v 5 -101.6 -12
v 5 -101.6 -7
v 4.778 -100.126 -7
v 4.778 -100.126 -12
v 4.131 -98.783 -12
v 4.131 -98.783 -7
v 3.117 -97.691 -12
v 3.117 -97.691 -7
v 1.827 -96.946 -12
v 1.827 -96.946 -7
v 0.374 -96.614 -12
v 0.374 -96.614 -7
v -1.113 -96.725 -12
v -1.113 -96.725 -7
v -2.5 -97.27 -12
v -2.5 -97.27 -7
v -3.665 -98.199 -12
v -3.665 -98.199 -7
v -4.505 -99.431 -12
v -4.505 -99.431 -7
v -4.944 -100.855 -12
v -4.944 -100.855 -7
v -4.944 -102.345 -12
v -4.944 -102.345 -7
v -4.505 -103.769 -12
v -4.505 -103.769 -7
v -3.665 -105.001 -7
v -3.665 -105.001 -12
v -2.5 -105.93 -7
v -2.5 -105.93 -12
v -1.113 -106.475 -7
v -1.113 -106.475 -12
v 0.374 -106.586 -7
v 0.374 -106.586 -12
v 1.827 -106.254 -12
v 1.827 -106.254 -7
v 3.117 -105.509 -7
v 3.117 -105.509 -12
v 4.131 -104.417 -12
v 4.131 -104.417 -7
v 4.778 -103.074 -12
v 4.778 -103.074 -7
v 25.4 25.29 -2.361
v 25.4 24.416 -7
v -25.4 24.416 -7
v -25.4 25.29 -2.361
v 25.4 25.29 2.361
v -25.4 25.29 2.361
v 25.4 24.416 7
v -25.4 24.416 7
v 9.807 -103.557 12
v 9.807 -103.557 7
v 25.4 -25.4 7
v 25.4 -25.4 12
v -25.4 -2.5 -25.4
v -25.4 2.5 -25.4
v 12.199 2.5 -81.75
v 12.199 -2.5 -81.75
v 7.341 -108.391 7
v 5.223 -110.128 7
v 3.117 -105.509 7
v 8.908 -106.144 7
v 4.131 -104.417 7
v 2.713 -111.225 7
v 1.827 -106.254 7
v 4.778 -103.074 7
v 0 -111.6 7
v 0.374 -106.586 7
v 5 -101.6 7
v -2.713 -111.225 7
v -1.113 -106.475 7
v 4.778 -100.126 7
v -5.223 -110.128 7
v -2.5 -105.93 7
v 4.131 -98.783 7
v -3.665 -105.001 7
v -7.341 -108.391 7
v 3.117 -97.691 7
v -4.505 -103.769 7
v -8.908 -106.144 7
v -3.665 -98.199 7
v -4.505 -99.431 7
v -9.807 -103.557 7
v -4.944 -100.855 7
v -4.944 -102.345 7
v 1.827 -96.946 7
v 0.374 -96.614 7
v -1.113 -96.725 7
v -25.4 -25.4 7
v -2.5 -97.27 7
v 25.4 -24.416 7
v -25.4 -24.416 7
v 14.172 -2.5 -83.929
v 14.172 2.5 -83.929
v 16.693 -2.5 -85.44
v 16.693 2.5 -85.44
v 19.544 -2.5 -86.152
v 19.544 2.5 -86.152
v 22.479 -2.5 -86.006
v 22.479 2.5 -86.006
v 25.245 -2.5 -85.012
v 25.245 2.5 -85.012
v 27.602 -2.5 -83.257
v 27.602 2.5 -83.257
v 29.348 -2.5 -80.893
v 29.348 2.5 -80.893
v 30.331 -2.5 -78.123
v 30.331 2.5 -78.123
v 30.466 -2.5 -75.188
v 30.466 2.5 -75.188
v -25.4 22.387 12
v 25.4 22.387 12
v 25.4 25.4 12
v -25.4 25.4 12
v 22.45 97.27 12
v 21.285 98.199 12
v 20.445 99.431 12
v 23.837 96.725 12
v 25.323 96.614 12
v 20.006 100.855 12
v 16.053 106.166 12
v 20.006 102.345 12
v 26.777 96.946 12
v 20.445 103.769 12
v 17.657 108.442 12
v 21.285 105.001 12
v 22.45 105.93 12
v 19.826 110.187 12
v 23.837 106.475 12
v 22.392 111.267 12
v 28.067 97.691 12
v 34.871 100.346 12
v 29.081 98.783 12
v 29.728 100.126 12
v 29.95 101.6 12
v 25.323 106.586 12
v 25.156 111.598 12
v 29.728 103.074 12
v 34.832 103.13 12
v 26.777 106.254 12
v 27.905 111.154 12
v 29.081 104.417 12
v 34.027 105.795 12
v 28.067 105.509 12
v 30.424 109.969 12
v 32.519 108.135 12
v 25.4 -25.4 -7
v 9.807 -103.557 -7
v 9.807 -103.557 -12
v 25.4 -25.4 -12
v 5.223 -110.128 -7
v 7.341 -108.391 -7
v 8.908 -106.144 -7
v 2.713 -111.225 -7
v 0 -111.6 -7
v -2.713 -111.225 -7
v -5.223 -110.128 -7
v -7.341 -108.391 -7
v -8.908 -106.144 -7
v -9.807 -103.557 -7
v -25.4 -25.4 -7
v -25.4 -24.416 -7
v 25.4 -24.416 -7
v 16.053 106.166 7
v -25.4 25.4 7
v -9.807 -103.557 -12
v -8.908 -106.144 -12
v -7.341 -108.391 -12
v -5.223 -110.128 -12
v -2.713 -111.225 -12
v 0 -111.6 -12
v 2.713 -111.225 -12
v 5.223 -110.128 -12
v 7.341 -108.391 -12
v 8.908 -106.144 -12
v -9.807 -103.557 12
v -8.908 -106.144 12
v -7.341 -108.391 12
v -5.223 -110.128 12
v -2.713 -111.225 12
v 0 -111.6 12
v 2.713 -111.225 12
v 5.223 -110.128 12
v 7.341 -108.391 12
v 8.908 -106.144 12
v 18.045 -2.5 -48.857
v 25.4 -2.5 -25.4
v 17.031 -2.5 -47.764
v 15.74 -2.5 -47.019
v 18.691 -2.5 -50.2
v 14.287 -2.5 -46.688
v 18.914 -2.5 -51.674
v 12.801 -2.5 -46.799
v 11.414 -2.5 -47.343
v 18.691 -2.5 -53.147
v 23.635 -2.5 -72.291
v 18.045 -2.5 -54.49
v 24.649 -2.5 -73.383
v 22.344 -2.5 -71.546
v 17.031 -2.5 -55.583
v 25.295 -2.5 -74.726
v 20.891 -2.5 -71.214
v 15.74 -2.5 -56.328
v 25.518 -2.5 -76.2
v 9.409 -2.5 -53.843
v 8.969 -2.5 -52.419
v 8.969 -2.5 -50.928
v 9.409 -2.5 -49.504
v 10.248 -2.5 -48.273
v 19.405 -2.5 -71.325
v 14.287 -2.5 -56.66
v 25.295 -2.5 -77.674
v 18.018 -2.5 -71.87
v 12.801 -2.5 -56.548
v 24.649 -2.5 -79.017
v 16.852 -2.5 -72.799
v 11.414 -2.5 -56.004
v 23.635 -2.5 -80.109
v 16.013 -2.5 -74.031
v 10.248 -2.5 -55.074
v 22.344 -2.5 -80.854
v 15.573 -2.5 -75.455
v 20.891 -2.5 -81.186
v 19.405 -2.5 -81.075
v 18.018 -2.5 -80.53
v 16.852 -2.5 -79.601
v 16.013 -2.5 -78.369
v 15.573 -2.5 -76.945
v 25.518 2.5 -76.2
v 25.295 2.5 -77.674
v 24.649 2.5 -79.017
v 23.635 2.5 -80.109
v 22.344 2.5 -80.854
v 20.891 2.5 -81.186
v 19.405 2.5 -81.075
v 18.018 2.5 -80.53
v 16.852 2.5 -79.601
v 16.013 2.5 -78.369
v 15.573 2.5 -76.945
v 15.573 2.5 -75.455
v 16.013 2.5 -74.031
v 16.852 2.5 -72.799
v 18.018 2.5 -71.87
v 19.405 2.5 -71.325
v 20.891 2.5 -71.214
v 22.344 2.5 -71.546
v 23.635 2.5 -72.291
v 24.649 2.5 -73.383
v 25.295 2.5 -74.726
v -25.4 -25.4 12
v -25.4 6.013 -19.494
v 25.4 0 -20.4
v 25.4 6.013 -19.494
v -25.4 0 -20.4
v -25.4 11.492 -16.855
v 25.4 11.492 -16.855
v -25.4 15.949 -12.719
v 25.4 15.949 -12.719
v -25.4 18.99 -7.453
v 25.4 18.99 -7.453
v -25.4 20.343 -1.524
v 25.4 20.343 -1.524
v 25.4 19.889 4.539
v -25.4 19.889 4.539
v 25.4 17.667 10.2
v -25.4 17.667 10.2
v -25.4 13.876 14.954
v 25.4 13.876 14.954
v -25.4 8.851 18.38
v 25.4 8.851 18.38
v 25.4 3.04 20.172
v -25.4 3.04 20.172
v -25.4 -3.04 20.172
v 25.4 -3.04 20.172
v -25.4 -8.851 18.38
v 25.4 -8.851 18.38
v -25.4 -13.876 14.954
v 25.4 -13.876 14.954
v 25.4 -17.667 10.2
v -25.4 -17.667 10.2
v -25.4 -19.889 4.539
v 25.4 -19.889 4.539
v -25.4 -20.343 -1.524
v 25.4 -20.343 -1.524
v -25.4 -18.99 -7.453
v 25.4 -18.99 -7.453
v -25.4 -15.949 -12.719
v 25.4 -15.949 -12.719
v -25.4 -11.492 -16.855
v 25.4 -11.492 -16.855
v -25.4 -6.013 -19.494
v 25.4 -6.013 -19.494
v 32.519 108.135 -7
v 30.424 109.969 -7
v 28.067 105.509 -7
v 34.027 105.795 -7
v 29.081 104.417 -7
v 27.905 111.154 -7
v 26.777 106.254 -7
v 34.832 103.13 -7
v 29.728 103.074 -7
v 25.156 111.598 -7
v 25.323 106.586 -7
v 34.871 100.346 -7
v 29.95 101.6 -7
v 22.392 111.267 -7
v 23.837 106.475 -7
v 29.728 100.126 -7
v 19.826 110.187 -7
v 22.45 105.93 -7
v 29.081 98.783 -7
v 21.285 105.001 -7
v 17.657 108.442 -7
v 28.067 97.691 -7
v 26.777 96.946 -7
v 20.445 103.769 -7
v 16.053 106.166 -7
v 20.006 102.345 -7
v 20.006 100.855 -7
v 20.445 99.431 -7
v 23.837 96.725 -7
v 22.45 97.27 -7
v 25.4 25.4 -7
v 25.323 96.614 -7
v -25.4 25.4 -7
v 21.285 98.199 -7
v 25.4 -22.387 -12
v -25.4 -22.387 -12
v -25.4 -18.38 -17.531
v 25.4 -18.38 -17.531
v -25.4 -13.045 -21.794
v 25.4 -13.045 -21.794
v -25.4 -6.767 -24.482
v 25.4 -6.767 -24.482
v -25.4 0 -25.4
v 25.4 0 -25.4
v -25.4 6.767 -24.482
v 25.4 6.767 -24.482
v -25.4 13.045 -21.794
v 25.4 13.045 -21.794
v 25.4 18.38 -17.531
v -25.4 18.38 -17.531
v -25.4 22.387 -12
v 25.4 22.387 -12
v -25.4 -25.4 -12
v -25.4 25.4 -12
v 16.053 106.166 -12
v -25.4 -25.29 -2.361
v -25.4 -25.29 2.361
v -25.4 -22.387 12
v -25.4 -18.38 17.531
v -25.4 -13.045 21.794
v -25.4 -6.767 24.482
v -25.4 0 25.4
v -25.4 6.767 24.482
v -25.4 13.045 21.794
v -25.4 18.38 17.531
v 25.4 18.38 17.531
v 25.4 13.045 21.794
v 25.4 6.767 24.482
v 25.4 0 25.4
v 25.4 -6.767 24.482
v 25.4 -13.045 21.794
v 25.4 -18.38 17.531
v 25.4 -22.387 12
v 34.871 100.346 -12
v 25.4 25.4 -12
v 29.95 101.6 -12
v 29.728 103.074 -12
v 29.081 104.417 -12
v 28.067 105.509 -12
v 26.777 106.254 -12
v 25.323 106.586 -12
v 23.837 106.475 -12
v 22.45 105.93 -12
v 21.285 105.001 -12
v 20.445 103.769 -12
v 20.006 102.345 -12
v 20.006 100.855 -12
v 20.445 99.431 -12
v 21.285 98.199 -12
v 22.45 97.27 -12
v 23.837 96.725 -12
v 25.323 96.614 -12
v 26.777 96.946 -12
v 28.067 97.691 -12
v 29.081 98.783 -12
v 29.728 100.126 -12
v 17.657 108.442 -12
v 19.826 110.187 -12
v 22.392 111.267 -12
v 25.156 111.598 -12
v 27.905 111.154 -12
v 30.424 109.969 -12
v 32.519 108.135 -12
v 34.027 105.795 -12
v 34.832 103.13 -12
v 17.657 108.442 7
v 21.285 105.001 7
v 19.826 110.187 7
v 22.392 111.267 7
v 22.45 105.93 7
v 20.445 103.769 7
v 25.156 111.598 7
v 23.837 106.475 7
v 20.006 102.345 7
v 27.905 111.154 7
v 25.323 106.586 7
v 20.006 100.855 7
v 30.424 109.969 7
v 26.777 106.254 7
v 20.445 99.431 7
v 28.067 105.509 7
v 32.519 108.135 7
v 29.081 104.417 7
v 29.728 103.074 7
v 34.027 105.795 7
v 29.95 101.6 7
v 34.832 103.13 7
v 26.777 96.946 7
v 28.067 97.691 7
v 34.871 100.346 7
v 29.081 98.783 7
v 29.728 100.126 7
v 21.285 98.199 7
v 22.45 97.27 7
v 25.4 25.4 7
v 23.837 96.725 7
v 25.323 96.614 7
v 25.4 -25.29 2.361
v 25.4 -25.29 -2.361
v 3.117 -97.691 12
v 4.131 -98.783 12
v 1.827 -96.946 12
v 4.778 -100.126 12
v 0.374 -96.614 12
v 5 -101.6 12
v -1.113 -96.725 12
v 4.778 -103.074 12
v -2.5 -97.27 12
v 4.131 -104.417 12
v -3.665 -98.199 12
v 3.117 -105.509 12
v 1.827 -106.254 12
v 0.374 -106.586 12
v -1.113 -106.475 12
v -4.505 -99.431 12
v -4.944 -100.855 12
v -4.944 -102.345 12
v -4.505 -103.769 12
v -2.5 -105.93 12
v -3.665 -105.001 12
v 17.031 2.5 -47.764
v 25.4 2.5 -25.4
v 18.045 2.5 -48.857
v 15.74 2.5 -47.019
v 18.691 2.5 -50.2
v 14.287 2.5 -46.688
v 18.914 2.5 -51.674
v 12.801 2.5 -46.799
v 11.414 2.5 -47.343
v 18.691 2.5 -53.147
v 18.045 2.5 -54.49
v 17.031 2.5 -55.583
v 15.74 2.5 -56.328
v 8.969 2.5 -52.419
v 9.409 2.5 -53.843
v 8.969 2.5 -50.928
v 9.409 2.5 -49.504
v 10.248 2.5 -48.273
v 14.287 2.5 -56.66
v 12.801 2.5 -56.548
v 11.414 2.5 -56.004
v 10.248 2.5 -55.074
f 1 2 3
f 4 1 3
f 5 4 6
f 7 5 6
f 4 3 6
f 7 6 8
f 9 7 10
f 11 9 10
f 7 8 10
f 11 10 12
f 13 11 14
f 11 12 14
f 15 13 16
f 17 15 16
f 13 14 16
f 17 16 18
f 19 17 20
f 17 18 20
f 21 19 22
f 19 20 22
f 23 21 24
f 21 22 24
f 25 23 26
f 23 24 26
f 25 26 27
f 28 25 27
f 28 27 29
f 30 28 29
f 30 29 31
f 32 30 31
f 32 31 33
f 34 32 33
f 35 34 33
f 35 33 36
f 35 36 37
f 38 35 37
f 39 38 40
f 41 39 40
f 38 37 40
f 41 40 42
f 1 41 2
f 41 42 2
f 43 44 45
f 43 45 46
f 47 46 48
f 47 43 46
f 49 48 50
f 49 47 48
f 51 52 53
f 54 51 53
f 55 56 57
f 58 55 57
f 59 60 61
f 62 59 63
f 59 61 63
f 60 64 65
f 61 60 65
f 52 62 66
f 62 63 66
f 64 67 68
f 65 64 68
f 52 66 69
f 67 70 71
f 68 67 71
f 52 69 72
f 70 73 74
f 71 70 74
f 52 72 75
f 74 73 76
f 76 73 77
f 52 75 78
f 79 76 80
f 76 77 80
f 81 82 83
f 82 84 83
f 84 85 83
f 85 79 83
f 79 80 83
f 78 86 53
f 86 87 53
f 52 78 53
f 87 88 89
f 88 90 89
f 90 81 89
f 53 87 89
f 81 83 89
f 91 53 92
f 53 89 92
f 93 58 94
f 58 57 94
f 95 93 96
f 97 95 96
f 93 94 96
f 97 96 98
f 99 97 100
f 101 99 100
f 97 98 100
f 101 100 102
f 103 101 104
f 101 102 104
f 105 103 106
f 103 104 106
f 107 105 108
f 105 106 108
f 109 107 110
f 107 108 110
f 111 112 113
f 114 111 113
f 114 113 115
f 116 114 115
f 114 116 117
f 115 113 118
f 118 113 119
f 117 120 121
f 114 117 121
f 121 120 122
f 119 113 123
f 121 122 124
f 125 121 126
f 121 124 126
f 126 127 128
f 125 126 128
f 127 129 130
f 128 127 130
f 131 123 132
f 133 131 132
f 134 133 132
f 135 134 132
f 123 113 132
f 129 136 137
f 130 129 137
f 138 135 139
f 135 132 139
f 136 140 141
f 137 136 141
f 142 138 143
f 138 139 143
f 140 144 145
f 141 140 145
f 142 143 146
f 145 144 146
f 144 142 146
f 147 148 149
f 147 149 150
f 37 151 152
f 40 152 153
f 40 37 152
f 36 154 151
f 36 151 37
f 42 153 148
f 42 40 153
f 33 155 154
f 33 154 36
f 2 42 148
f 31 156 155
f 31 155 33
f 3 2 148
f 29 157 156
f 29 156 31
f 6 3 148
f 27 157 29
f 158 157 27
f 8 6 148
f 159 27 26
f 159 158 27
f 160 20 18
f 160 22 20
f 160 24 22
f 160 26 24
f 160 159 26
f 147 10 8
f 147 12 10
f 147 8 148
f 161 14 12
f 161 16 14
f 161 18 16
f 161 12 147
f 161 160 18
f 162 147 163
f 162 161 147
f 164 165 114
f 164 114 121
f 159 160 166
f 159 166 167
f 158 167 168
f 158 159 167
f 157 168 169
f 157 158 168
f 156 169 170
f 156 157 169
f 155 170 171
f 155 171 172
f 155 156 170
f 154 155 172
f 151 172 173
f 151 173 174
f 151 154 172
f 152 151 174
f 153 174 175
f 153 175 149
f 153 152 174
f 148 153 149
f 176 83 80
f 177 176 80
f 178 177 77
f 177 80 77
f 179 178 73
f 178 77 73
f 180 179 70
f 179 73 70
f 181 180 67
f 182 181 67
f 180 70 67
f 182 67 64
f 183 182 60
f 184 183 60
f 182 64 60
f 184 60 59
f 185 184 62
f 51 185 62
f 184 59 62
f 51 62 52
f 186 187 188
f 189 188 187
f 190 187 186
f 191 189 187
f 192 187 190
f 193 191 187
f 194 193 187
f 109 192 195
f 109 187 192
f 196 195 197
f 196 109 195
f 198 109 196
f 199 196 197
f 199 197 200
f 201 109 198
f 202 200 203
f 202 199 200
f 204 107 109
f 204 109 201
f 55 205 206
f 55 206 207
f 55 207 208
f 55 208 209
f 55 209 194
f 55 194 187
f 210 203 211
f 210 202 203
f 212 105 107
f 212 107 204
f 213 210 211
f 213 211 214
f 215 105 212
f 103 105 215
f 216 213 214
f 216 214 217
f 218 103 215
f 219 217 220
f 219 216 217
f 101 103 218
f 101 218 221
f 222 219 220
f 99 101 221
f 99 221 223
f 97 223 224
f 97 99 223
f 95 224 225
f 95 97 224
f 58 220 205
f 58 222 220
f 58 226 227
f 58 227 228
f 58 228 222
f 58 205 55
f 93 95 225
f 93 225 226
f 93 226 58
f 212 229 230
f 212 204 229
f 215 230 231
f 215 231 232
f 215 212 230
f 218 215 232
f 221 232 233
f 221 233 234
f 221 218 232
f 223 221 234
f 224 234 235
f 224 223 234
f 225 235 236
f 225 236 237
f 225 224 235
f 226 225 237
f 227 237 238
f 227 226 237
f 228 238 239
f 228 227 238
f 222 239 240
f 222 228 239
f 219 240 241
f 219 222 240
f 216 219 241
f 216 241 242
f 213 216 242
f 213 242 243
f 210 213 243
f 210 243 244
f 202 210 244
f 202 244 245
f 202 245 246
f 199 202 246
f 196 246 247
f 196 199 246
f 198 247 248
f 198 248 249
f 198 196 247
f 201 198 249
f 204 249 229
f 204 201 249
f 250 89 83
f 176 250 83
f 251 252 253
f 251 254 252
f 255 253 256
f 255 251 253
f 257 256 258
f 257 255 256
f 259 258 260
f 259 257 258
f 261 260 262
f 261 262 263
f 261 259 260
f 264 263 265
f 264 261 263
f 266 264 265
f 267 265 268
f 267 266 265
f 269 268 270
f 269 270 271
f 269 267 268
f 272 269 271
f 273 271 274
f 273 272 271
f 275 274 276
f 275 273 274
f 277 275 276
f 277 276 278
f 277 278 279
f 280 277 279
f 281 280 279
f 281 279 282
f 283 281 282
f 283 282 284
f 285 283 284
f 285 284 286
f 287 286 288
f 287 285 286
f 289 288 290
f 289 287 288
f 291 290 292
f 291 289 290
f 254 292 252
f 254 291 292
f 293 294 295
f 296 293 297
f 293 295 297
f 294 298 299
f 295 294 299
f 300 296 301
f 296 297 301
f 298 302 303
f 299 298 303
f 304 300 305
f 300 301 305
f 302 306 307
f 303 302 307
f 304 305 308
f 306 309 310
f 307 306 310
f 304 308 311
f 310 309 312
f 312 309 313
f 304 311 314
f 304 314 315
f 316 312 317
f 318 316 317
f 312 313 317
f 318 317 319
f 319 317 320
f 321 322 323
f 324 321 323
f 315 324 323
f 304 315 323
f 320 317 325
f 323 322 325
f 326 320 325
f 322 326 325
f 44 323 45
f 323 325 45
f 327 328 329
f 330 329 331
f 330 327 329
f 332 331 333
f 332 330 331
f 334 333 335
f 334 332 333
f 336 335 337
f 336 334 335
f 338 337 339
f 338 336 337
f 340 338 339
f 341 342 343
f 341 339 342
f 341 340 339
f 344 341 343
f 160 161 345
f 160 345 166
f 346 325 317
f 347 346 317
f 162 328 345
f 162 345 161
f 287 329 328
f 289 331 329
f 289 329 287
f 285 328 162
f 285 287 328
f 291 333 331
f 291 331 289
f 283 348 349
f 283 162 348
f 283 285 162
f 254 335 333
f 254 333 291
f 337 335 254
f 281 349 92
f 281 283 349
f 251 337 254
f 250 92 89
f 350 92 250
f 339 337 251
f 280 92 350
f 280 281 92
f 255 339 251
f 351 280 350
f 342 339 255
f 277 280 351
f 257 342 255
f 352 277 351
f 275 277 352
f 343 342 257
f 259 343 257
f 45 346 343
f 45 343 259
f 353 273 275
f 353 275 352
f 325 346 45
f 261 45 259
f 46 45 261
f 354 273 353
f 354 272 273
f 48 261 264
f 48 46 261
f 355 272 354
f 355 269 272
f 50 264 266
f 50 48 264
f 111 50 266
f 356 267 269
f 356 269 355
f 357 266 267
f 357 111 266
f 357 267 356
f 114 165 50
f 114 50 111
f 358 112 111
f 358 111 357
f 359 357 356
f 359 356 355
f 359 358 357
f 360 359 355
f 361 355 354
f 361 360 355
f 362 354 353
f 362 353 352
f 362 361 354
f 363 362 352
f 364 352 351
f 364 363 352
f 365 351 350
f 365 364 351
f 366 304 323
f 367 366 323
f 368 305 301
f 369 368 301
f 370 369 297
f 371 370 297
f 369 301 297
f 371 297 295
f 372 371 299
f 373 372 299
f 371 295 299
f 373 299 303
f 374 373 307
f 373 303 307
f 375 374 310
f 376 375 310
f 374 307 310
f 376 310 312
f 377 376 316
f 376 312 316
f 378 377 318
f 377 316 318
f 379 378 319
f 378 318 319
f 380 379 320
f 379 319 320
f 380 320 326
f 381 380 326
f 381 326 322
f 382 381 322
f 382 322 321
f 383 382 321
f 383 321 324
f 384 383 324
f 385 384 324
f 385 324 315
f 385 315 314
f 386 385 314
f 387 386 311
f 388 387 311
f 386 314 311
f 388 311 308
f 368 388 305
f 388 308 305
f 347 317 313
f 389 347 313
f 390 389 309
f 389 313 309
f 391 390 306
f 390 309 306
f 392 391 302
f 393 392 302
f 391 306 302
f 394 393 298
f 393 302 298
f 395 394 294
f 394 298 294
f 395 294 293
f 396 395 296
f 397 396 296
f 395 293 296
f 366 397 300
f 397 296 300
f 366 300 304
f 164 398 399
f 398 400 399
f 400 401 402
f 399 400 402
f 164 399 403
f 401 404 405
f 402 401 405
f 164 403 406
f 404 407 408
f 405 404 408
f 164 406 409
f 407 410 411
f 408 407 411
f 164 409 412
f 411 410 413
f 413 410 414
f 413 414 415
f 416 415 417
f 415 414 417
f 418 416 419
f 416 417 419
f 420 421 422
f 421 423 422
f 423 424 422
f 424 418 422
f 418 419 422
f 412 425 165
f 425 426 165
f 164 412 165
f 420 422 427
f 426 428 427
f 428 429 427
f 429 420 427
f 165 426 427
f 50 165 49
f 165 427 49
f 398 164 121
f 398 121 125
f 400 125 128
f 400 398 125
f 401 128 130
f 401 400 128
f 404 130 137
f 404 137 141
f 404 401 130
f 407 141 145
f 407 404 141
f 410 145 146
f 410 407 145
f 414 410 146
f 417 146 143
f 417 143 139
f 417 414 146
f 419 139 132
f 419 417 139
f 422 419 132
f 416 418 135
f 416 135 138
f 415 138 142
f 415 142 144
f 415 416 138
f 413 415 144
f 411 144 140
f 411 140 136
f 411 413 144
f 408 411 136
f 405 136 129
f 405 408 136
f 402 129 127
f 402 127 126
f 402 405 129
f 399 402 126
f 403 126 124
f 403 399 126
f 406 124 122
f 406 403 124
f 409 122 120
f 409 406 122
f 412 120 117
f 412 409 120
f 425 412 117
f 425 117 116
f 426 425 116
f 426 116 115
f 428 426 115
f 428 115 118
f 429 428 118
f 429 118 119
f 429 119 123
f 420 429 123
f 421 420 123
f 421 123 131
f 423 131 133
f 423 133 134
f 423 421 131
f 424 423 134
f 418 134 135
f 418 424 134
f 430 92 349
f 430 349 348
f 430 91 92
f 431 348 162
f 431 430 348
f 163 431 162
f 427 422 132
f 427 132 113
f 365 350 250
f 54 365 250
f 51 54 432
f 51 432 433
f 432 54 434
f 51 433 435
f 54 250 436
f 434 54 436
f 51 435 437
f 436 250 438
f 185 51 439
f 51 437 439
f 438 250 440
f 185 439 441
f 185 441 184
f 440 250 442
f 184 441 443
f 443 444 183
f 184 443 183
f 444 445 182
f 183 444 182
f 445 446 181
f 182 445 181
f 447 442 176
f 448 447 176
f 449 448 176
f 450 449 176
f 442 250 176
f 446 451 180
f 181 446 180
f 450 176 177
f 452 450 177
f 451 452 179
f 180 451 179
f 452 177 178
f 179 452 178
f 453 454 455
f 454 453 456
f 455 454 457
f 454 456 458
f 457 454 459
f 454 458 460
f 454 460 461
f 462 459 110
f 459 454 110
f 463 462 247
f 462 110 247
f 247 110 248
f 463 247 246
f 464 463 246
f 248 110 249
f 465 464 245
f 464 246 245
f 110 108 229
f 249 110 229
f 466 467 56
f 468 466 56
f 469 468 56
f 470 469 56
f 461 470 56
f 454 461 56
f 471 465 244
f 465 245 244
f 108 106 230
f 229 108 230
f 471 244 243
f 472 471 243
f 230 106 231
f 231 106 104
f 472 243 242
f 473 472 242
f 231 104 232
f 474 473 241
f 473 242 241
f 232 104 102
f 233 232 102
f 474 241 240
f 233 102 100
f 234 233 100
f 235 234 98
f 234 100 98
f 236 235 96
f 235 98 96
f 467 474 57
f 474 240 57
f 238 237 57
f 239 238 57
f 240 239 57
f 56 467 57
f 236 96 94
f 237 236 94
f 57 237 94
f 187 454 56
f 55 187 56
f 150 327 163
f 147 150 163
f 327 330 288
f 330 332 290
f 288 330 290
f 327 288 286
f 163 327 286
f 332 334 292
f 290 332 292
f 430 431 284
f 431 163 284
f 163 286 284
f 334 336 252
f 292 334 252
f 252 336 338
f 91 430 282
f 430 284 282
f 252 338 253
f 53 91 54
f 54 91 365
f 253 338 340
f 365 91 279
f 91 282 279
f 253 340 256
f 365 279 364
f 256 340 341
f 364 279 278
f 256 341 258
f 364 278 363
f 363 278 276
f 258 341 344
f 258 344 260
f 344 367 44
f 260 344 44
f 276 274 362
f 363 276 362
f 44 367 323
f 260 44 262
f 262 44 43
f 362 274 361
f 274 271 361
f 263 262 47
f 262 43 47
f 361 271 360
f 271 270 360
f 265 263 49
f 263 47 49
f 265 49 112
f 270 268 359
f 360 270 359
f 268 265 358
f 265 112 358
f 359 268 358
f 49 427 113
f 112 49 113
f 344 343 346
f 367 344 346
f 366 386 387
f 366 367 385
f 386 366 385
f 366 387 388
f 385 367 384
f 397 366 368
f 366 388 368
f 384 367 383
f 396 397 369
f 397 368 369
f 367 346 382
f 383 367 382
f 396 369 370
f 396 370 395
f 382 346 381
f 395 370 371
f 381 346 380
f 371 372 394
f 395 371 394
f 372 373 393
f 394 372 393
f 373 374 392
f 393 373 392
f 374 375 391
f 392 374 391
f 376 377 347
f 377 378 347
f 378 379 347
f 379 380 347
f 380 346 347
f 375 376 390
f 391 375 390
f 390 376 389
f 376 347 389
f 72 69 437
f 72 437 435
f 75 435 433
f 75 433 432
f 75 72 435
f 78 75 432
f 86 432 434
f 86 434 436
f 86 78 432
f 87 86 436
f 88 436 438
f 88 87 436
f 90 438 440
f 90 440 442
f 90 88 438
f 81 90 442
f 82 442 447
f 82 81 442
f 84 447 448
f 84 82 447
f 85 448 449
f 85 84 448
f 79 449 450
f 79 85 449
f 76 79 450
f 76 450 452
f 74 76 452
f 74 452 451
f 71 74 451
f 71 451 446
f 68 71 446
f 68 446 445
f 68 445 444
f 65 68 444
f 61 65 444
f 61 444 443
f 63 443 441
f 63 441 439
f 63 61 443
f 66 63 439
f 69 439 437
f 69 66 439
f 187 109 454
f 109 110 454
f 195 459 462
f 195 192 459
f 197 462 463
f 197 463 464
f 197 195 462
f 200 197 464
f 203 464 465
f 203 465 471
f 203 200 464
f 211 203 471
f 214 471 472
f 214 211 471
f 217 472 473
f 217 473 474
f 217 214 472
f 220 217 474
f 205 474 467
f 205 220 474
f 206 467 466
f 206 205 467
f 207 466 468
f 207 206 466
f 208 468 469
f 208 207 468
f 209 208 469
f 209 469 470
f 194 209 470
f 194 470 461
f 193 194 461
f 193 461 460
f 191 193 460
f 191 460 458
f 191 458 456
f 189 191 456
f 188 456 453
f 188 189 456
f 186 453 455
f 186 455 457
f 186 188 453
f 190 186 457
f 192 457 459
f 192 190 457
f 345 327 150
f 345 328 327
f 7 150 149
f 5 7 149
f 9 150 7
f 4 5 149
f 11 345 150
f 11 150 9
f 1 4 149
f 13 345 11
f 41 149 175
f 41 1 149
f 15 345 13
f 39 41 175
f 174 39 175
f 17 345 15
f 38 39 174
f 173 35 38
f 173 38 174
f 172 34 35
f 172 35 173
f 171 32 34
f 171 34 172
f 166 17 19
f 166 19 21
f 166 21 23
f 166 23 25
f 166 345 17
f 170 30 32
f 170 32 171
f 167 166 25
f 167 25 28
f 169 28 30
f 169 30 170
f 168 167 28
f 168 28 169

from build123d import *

# Parameters (mm, degrees)
SKETCH2_R             = 25.4
SKETCH2_R_2           = 20.4
BOSS_EXTRUDE1_DEPTH   = 25.4
BOSS_EXTRUDE2_START   = 7
SKETCH3_R             = 5
BOSS_EXTRUDE2_DEPTH   = 5
BOSS_EXTRUDE2_2_DEPTH = 5
BOSS_EXTRUDE3_START   = -7
SKETCH3_2_R           = 5
BOSS_EXTRUDE3_DEPTH   = 5
BOSS_EXTRUDE3_2_DEPTH = 5
BOSS_EXTRUDE4_DEPTH   = 25.4
SKETCH6_R             = 5
BOSS_EXTRUDE6_DEPTH   = 2.5


with BuildPart() as part:
    # Sketch2 → Boss-Extrude1 (new, symmetric)
    with BuildSketch(Plane(origin=(0, 0, 0), x_dir=(0, 0, -1), z_dir=(1, 0, 0))):
        Circle(SKETCH2_R)
        Circle(SKETCH2_R_2, mode=Mode.SUBTRACT)
    extrude(amount=BOSS_EXTRUDE1_DEPTH, both=True)



with BuildPart() as body_2:
    # Sketch3 → Boss-Extrude2 (new body)
    with BuildSketch(Plane.XY.offset(BOSS_EXTRUDE2_START)):
        with BuildLine():
            Line((-25.4, 25.4), (16.053197995, 106.166187415))
            ThreePointArc((16.053197995, 106.166187415), (27.904518621, 111.153521469), (34.870920337, 100.346276275))
            Line((34.870920337, 100.346276275), (25.4, 25.4))
            Line((25.4, 25.4), (-25.4, 25.4))
        make_face()
        with Locations((24.949822775, 101.6)):
            Circle(SKETCH3_R, mode=Mode.SUBTRACT)
    extrude(amount=BOSS_EXTRUDE2_DEPTH)


with BuildPart() as body_3:
    # Sketch3 → Boss-Extrude2 2 (new body)
    with BuildSketch(Plane.XY.offset(BOSS_EXTRUDE2_START)):
        with BuildLine():
            Line((-25.4, -25.4), (-9.806723533, -103.556571886))
            ThreePointArc((-9.806723533, -103.556571886), (0, -111.6), (9.806723533, -103.556571886))
            Line((9.806723533, -103.556571886), (25.4, -25.4))
            Line((25.4, -25.4), (-25.4, -25.4))
        make_face()
        with Locations((0, -101.6)):
            Circle(SKETCH3_R, mode=Mode.SUBTRACT)
    extrude(amount=BOSS_EXTRUDE2_2_DEPTH)


with BuildPart() as body_4:
    # Sketch3<2> → Boss-Extrude3 (new body)
    with BuildSketch(Plane.XY.offset(BOSS_EXTRUDE3_START)):
        with BuildLine():
            Line((-25.4, 25.4), (16.053197995, 106.166187415))
            ThreePointArc((16.053197995, 106.166187415), (27.904518621, 111.153521469), (34.870920337, 100.346276275))
            Line((34.870920337, 100.346276275), (25.4, 25.4))
            Line((25.4, 25.4), (-25.4, 25.4))
        make_face()
        with Locations((24.949822775, 101.6)):
            Circle(SKETCH3_2_R, mode=Mode.SUBTRACT)
    extrude(amount=-BOSS_EXTRUDE3_DEPTH)


with BuildPart() as body_5:
    # Sketch3<2> → Boss-Extrude3 2 (new body)
    with BuildSketch(Plane.XY.offset(BOSS_EXTRUDE3_START)):
        with BuildLine():
            Line((-25.4, -25.4), (-9.806723533, -103.556571886))
            ThreePointArc((-9.806723533, -103.556571886), (0, -111.6), (9.806723533, -103.556571886))
            Line((9.806723533, -103.556571886), (25.4, -25.4))
            Line((25.4, -25.4), (-25.4, -25.4))
        make_face()
        with Locations((0, -101.6)):
            Circle(SKETCH3_2_R, mode=Mode.SUBTRACT)
    extrude(amount=-BOSS_EXTRUDE3_2_DEPTH)


with BuildPart() as part_1:
    add(part.part)

    add(body_2.part)  # Boss-Extrude4 merges body 2

    add(body_3.part)  # Boss-Extrude4 merges body 3

    add(body_4.part)  # Boss-Extrude4 merges body 4

    add(body_5.part)  # Boss-Extrude4 merges body 5
    # Sketch4 → Boss-Extrude4 (add, symmetric)
    with BuildSketch(Plane(origin=(0, 0, 0), x_dir=(0, 0, -1), z_dir=(1, 0, 0))):
        with BuildLine():
            Line((-12, -25.4), (-7, -25.4))
            Line((-7, -25.4), (-7, -24.416387939))
            ThreePointArc((-7, -24.416387939), (-9.554057075, -23.534655158), (-12, -22.386603137))
            Line((-12, -22.386603137), (-12, -25.4))
        make_face()
        with BuildLine():
            Line((12, -25.4), (7, -25.4))
            Line((7, -25.4), (7, -24.416387939))
            ThreePointArc((7, -24.416387939), (9.554057075, -23.534655158), (12, -22.386603137))
            Line((12, -22.386603137), (12, -25.4))
        make_face()
        with BuildLine():
            Line((12, 25.4), (7, 25.4))
            Line((7, 25.4), (7, 24.416387939))
            ThreePointArc((7, 24.416387939), (9.554057075, 23.534655158), (12, 22.386603137))
            Line((12, 22.386603137), (12, 25.4))
        make_face()
        with BuildLine():
            Line((-12, 25.4), (-7, 25.4))
            Line((-7, 25.4), (-7, 24.416387939))
            ThreePointArc((-7, 24.416387939), (-9.554057075, 23.534655158), (-12, 22.386603137))
            Line((-12, 22.386603137), (-12, 25.4))
        make_face()
    extrude(amount=BOSS_EXTRUDE4_DEPTH, both=True)


with BuildPart() as body_2_2:
    # Sketch6 → Boss-Extrude6 (new, symmetric)
    with BuildSketch(Plane(origin=(0, 0, 0), x_dir=(1, 0, 0), z_dir=(0, 1, 0))):
        with BuildLine():
            Line((-25.4, 25.4), (12.199244226, 81.750309743))
            ThreePointArc((12.199244226, 81.750309743), (23.898598023, 85.611081427), (30.466168735, 75.18767257))
            Line((30.466168735, 75.18767257), (25.4, 25.4))
            Line((25.4, 25.4), (-25.4, 25.4))
        make_face()
        with Locations((20.517541032, 76.2)):
            Circle(SKETCH6_R, mode=Mode.SUBTRACT)
        with Locations((13.913567634, 51.673533981)):
            Circle(SKETCH6_R, mode=Mode.SUBTRACT)
    extrude(amount=BOSS_EXTRUDE6_DEPTH, both=True)


solid = Compound([part_1.part, body_2_2.part])
